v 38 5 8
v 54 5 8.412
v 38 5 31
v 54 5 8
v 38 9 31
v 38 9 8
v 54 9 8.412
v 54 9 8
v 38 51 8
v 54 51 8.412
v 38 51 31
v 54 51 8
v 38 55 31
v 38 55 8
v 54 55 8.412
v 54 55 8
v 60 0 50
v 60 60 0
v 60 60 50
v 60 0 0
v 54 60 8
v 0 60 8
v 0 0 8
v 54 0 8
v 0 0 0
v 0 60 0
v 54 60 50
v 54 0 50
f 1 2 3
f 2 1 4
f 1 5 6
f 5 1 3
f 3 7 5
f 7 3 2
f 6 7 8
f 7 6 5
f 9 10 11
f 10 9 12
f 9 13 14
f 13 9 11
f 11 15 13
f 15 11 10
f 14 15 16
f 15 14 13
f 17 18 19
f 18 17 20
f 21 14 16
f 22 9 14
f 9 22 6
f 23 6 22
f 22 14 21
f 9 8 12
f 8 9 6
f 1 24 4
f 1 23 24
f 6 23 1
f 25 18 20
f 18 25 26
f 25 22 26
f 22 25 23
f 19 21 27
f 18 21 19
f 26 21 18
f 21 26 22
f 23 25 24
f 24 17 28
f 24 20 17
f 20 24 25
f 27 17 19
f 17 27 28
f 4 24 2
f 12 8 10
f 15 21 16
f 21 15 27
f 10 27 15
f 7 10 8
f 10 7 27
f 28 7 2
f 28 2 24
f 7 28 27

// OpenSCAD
$fn = 32;

// ----------------------------------------------------------------------
// Rib bracket: 2-gusset L bracket
// ----------------------------------------------------------------------

// --- parameters (mm) ---
base_l = 60;              // foot length, X
base_w = 60;              // foot width, Y
base_t = 8;               // foot thickness
plate_t = 6;              // upright plate thickness
plate_h = 50;             // overall height
gus_l = 16;               // gusset leg along the foot
gus_h = 24;               // gusset height
gus_t = 4;                // gusset thickness
gus_edge = 5;             // gusset margin from the foot edge
n_gus = 2;                // gusset count

gus_pitch = (base_w - 2 * gus_edge - gus_t) / (n_gus - 1);  // gusset pitch

union() {
  cube([base_l, base_w, base_t]);
  translate([base_l - plate_t, 0, base_t - 1])
    cube([plate_t, base_w, plate_h - base_t + 1]);
  for (i = [0 : n_gus - 1])
    translate([base_l - plate_t - gus_l, gus_edge + i * gus_pitch, base_t - 1])
      rotate([-90, 0, 0])
        linear_extrude(height = gus_t)
          polygon(points = [[0, 0], [gus_l + 1, 0], [0, -gus_h]]);
}
